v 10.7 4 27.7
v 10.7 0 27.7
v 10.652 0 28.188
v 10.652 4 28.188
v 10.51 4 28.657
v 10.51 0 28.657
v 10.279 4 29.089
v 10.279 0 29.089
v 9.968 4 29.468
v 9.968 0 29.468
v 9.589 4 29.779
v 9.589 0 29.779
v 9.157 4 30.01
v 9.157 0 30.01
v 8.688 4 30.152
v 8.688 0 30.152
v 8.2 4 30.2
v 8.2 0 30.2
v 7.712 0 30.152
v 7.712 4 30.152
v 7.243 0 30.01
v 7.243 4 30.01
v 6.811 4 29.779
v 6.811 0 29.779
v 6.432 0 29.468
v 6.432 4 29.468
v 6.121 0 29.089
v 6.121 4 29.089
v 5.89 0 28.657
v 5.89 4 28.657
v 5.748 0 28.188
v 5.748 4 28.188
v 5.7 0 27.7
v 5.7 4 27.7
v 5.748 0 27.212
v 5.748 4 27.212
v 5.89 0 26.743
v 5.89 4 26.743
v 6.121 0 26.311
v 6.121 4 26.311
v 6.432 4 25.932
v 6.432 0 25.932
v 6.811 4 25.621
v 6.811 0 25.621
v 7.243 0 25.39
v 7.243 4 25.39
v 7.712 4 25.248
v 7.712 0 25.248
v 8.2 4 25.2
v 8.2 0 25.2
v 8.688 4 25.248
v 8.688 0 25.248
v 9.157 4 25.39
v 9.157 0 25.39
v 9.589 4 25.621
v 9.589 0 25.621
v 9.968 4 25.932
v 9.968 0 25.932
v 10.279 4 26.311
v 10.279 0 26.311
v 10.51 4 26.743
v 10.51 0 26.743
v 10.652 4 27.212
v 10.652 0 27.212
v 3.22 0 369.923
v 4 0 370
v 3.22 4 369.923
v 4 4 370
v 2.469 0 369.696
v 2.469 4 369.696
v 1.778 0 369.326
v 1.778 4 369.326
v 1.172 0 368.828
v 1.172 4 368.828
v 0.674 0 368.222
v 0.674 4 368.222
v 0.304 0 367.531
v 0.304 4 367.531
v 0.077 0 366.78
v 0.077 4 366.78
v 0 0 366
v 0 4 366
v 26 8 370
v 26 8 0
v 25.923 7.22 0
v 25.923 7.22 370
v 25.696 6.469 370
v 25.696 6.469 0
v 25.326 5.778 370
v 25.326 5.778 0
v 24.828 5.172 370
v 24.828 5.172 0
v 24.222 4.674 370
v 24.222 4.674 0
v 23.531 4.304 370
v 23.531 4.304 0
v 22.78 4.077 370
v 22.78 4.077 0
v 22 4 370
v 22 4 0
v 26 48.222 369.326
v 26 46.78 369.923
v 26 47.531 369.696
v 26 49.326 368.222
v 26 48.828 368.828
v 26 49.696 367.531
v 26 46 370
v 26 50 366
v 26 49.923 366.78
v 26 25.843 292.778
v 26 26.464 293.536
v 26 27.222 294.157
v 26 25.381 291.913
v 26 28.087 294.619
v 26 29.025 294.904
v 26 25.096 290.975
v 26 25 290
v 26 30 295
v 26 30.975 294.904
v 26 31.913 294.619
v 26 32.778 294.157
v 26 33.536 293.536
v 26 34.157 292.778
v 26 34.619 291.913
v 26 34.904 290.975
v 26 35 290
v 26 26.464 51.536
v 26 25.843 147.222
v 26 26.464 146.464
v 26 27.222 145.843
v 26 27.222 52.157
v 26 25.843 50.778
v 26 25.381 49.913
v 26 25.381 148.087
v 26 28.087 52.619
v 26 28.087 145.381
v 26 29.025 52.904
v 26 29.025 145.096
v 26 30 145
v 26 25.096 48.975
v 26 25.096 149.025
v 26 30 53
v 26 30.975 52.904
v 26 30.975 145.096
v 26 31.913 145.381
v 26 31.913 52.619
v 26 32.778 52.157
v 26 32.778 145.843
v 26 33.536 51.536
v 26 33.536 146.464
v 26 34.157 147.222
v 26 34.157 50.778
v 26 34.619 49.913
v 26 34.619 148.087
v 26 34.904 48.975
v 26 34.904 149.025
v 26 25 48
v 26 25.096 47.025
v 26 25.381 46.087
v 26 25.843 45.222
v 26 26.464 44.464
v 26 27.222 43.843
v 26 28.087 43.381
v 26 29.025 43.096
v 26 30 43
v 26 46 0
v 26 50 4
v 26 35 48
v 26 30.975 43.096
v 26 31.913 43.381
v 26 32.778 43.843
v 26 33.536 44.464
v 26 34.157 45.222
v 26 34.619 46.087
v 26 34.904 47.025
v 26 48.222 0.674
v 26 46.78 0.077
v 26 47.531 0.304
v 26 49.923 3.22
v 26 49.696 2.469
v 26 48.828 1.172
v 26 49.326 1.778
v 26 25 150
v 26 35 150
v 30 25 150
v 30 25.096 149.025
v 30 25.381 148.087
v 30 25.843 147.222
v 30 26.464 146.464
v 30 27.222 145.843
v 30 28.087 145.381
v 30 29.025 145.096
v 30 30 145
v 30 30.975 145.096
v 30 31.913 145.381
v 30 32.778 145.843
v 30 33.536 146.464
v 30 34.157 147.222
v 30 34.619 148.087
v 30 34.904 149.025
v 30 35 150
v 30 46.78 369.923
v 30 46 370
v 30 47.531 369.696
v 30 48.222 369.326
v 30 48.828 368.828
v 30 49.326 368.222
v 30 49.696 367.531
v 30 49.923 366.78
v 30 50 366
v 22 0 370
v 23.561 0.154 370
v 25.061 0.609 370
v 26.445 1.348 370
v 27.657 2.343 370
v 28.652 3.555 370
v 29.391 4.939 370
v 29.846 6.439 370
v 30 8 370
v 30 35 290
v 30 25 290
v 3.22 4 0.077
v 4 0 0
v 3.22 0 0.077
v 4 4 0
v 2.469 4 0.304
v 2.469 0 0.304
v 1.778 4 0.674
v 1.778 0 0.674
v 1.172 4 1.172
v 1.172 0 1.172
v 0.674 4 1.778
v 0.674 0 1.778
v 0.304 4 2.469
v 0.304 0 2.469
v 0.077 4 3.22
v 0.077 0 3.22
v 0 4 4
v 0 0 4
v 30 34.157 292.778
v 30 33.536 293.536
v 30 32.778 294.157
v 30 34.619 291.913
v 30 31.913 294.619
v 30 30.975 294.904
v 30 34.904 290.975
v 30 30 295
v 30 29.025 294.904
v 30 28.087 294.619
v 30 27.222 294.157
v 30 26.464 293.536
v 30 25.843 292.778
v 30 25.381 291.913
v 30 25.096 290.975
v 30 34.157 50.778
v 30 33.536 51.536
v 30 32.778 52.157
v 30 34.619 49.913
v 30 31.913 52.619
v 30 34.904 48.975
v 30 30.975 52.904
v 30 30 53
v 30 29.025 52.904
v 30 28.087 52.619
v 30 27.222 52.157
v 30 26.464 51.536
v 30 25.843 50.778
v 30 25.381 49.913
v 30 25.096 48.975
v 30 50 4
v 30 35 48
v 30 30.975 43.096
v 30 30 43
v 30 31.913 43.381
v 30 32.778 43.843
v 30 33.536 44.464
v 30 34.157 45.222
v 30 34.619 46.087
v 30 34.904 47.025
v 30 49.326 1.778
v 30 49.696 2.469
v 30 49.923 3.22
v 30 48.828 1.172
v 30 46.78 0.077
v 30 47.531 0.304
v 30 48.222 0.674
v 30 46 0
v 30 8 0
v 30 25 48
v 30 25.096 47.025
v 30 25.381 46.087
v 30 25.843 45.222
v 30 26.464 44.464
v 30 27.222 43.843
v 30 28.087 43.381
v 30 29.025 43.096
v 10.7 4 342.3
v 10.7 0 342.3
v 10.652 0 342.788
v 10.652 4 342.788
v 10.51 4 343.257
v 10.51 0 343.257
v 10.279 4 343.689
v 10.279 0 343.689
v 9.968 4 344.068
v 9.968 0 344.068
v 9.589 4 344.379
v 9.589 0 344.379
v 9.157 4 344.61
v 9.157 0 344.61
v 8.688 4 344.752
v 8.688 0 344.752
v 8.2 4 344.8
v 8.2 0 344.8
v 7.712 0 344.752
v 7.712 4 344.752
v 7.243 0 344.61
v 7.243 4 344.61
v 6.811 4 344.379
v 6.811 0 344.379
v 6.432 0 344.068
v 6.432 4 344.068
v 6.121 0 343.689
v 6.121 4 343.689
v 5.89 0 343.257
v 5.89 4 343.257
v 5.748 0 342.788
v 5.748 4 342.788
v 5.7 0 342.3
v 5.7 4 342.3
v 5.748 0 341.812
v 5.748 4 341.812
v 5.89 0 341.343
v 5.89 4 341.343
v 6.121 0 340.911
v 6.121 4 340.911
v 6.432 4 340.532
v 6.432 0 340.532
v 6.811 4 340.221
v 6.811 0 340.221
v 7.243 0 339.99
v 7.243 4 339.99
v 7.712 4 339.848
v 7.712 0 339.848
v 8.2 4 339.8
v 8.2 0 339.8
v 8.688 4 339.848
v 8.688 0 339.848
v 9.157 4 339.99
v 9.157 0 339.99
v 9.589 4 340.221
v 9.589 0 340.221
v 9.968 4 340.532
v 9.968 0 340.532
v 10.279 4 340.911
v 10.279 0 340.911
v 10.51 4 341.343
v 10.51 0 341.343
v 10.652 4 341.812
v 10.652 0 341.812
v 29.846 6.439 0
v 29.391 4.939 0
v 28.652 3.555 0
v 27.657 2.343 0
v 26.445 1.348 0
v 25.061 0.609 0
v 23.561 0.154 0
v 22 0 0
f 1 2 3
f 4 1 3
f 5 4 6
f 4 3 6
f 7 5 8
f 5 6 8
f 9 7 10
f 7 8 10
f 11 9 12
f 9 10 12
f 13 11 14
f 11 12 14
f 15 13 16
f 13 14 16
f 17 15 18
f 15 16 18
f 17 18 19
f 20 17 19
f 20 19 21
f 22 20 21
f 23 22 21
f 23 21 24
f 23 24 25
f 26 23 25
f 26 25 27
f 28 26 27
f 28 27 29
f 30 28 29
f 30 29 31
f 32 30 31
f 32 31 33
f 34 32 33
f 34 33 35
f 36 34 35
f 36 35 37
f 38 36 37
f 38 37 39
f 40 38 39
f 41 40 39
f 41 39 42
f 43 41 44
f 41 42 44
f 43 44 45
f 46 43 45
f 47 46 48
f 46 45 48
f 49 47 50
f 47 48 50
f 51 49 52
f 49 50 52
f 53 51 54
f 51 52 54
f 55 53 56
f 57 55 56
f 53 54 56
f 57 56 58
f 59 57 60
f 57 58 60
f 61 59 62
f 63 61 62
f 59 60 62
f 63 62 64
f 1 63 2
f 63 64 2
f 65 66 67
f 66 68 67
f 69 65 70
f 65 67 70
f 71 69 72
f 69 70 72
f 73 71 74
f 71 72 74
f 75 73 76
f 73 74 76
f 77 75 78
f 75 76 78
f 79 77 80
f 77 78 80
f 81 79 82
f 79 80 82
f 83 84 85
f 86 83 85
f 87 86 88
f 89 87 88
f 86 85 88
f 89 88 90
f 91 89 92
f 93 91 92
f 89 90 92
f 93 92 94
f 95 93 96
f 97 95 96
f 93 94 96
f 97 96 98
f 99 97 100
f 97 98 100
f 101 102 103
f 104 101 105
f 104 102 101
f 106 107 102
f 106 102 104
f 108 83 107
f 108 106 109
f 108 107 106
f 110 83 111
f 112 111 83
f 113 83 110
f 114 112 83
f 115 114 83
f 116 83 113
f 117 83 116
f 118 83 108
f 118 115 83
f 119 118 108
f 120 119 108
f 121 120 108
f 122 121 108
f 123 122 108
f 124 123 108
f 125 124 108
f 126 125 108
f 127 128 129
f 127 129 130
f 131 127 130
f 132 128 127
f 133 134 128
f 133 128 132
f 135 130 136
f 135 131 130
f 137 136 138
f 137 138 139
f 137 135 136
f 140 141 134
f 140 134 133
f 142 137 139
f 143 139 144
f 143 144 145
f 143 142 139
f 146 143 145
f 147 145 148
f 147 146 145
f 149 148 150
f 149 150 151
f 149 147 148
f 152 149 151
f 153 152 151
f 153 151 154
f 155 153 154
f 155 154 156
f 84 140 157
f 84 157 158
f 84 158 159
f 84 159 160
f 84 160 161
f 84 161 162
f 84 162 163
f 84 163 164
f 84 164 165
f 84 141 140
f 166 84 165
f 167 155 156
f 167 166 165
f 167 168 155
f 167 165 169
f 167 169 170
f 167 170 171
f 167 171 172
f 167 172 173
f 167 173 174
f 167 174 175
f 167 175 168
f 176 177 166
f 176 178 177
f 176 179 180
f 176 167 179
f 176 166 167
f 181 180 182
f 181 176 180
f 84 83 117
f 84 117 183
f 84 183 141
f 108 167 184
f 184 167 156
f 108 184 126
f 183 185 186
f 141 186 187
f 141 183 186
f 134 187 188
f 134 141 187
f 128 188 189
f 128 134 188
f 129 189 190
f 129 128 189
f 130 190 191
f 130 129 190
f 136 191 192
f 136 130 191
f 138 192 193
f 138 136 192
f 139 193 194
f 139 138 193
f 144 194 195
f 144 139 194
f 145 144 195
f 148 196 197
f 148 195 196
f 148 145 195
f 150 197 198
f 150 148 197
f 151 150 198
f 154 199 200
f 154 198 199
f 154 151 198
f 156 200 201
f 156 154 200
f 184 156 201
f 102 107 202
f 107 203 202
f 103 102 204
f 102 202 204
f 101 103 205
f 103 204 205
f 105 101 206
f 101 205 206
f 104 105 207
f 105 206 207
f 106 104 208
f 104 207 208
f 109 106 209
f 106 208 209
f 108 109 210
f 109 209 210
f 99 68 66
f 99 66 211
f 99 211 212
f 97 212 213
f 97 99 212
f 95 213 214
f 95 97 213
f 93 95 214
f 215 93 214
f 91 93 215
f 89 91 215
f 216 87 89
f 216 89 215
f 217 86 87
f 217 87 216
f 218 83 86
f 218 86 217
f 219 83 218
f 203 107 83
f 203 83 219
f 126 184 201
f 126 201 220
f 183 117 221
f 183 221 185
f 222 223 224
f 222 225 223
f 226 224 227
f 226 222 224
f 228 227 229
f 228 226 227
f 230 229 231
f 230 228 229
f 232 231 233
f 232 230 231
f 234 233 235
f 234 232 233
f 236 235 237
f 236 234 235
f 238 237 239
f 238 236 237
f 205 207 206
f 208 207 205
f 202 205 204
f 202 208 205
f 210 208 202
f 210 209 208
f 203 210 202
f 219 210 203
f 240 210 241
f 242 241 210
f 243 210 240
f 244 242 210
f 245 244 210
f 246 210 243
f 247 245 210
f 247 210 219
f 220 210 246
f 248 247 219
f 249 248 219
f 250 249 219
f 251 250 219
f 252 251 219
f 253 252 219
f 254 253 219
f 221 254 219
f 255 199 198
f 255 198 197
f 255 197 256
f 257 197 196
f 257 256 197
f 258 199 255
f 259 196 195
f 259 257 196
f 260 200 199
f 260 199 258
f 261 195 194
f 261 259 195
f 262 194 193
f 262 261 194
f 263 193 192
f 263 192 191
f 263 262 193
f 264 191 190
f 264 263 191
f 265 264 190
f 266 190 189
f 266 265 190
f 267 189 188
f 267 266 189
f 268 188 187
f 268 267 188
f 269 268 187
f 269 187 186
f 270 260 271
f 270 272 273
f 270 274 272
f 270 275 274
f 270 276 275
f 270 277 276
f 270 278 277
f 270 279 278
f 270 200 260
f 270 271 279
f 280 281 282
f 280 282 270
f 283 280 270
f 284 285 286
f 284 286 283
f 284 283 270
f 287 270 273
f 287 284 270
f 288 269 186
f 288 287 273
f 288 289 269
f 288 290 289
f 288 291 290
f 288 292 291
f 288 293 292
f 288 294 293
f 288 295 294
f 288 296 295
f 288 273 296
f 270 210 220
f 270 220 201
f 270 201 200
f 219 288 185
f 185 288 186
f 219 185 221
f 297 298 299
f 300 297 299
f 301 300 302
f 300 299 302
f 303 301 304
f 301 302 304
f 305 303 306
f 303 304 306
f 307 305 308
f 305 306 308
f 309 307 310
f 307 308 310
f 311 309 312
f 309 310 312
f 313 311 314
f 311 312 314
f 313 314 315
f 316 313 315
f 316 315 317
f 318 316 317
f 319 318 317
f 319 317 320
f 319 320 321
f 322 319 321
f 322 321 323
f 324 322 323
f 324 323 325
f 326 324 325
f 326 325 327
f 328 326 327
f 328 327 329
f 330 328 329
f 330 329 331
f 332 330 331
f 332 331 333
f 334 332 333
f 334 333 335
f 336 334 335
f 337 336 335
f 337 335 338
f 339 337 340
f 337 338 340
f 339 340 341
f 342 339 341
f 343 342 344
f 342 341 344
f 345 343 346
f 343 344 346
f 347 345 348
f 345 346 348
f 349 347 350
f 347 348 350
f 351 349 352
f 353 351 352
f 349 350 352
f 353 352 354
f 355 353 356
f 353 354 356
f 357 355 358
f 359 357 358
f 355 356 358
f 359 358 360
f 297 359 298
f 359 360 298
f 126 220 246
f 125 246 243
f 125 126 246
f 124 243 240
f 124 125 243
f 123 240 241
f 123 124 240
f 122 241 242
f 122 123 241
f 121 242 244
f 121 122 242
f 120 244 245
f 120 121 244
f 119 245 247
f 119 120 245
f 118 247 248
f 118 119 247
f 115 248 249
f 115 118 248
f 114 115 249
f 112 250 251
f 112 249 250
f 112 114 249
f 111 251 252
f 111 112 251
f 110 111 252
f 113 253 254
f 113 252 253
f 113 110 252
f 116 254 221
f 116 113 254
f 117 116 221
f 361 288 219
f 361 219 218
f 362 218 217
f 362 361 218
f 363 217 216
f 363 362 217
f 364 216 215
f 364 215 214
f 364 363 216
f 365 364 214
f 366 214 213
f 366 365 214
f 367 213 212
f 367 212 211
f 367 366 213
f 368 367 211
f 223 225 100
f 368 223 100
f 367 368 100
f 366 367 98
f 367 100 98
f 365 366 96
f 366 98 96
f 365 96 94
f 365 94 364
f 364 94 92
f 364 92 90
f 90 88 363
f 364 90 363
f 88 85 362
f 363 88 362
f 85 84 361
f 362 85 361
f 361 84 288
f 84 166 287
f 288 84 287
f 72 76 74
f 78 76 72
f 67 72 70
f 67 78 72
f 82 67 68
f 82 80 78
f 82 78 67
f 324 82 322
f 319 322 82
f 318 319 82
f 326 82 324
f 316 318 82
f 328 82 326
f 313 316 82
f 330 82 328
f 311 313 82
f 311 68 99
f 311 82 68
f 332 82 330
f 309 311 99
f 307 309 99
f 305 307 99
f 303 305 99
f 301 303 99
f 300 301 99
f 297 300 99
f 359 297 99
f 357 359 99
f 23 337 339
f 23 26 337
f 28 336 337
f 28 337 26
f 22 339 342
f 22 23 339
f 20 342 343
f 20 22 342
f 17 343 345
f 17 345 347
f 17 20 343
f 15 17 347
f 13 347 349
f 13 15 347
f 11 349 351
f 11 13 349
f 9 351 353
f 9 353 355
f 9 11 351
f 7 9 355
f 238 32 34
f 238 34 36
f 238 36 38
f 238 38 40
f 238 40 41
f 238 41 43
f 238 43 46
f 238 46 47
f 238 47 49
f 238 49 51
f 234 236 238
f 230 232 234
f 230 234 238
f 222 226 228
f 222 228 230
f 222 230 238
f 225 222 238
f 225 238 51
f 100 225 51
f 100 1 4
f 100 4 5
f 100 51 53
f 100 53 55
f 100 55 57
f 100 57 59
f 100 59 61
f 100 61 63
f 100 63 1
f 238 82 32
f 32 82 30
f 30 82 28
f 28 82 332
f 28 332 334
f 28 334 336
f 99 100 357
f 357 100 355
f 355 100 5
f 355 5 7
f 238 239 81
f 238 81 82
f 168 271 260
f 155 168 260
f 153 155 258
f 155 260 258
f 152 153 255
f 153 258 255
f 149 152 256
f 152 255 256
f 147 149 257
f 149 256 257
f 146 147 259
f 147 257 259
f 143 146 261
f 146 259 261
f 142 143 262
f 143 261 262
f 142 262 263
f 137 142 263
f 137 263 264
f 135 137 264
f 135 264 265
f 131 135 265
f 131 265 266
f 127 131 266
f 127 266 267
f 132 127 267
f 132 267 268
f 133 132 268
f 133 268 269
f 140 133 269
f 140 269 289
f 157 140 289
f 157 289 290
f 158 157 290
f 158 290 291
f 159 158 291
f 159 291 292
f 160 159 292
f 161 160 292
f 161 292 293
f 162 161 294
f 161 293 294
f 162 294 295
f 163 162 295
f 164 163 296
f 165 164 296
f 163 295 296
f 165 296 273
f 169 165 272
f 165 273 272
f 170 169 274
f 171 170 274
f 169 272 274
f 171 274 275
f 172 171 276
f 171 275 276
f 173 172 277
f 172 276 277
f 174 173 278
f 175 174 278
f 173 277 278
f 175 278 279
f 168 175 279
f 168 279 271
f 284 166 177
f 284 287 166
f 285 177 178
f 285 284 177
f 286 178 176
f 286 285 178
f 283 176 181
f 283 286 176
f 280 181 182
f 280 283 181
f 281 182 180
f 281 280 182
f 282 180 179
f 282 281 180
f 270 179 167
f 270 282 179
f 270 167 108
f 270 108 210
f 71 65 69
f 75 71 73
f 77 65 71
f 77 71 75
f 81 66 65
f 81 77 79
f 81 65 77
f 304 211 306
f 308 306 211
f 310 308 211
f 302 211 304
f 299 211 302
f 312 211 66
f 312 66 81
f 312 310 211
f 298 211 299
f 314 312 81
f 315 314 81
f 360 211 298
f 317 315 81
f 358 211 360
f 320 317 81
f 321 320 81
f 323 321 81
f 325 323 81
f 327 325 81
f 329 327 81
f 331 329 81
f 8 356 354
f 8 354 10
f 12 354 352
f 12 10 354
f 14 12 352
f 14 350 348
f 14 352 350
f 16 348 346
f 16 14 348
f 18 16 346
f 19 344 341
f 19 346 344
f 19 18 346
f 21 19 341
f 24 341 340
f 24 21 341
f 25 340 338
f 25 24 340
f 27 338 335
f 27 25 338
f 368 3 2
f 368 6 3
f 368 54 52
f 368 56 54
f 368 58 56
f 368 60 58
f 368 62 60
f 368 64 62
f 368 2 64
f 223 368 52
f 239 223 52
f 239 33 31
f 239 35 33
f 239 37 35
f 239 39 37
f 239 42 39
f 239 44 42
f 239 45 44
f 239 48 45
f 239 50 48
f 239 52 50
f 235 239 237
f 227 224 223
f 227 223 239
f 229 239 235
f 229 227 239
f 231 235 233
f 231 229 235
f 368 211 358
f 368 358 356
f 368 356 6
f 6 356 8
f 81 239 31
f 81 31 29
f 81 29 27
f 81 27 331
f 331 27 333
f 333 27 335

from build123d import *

# Parameters (mm, degrees)
BOSS_EXTRUDE1_DEPTH    = 370
CUT_EXTRUDE1_REACH     = 376.267
SKETCH4_R              = 5
CUT_EXTRUDE2_DEPTH     = 375.566416007
SKETCH5_R              = 2.5
CUT_EXTRUDE3_DEPTH     = 375.566416007
SKETCH6_R              = 2.5
CUT_EXTRUDE4_DEPTH     = 375.566416007
CONVERT_SOLID1_DEPTH   = 370
CONVERT_SOLID1_2_DEPTH = 370
FILLET1_R              = 4


# Read off the part's stored shape, not the designer's step: Convert-Solid1
with BuildPart() as part:
    # Sketch1 → Boss-Extrude1 (new body)
    with BuildSketch(Plane.XY):
        Polygon((0, 0), (0, 4), (26, 4), (26, 50), (30, 50), (30, 0), align=None)
    extrude(amount=BOSS_EXTRUDE1_DEPTH)

    # Sketch3 → Cut-Extrude1 (cut, up to next)
    with BuildSketch(Plane.ZY.offset(-26), mode=Mode.PRIVATE) as cut_extrude1_sk1:
        with BuildLine():
            Line((150, 35), (290, 35))
            ThreePointArc((290, 35), (295, 30), (290, 25))
            Line((290, 25), (150, 25))
            ThreePointArc((150, 25), (145, 30), (150, 35))
        make_face()
    cut_extrude1_tool1 = extrude(cut_extrude1_sk1.sketch, amount=-CUT_EXTRUDE1_REACH, mode=Mode.PRIVATE) & part.part
    add(cut_extrude1_tool1.solids().sort_by_distance((26, 30, 220))[0], mode=Mode.SUBTRACT)

    # Sketch4 → Cut-Extrude2 (cut, through all)
    with BuildSketch(Plane(origin=(30, 0, 0), x_dir=(0, 0, -1), z_dir=(1, 0, 0))):
        with Locations(Location((-48, 30, 0), (0, 0, 90))):
            Circle(SKETCH4_R)
    extrude(amount=-CUT_EXTRUDE2_DEPTH, mode=Mode.SUBTRACT)

    # Sketch5 → Cut-Extrude3 (cut, through all)
    with BuildSketch(Plane.XZ):
        with Locations((8.2, 27.7)):
            Circle(SKETCH5_R)
    extrude(amount=-CUT_EXTRUDE3_DEPTH, mode=Mode.SUBTRACT)

    # Sketch6 → Cut-Extrude4 (cut, through all)
    with BuildSketch(Plane.XZ):
        with Locations((8.2, 342.3)):
            Circle(SKETCH6_R)
    extrude(amount=-CUT_EXTRUDE4_DEPTH, mode=Mode.SUBTRACT)

    # Convert-Solid1 outline → Convert-Solid1 (cut)
    with BuildSketch(Plane.XY):
        with BuildLine():
            ThreePointArc((30, 8), (27.656854249, 2.343145751), (22, 0))
            Line((22, 0), (30, 0))
            Line((30, 0), (30, 8))
        make_face()
    extrude(amount=CONVERT_SOLID1_DEPTH, mode=Mode.SUBTRACT)

    # Convert-Solid1 2 outline → Convert-Solid1 2 (add)
    with BuildSketch(Plane.XY):
        with BuildLine():
            ThreePointArc((26, 8), (24.828427125, 5.171572875), (22, 4))
            Line((22, 4), (26, 4))
            Line((26, 4), (26, 8))
        make_face()
    extrude(amount=CONVERT_SOLID1_2_DEPTH)

    # Fillet1
    fillet1_edges = [part.edges().sort_by_distance(p)[0] for p in [
        (28, 50, 0),
        (28, 50, 370),
        (0, 2, 370),
        (0, 2, 0),
    ]]
    fillet(fillet1_edges, radius=FILLET1_R)


solid = part.part
